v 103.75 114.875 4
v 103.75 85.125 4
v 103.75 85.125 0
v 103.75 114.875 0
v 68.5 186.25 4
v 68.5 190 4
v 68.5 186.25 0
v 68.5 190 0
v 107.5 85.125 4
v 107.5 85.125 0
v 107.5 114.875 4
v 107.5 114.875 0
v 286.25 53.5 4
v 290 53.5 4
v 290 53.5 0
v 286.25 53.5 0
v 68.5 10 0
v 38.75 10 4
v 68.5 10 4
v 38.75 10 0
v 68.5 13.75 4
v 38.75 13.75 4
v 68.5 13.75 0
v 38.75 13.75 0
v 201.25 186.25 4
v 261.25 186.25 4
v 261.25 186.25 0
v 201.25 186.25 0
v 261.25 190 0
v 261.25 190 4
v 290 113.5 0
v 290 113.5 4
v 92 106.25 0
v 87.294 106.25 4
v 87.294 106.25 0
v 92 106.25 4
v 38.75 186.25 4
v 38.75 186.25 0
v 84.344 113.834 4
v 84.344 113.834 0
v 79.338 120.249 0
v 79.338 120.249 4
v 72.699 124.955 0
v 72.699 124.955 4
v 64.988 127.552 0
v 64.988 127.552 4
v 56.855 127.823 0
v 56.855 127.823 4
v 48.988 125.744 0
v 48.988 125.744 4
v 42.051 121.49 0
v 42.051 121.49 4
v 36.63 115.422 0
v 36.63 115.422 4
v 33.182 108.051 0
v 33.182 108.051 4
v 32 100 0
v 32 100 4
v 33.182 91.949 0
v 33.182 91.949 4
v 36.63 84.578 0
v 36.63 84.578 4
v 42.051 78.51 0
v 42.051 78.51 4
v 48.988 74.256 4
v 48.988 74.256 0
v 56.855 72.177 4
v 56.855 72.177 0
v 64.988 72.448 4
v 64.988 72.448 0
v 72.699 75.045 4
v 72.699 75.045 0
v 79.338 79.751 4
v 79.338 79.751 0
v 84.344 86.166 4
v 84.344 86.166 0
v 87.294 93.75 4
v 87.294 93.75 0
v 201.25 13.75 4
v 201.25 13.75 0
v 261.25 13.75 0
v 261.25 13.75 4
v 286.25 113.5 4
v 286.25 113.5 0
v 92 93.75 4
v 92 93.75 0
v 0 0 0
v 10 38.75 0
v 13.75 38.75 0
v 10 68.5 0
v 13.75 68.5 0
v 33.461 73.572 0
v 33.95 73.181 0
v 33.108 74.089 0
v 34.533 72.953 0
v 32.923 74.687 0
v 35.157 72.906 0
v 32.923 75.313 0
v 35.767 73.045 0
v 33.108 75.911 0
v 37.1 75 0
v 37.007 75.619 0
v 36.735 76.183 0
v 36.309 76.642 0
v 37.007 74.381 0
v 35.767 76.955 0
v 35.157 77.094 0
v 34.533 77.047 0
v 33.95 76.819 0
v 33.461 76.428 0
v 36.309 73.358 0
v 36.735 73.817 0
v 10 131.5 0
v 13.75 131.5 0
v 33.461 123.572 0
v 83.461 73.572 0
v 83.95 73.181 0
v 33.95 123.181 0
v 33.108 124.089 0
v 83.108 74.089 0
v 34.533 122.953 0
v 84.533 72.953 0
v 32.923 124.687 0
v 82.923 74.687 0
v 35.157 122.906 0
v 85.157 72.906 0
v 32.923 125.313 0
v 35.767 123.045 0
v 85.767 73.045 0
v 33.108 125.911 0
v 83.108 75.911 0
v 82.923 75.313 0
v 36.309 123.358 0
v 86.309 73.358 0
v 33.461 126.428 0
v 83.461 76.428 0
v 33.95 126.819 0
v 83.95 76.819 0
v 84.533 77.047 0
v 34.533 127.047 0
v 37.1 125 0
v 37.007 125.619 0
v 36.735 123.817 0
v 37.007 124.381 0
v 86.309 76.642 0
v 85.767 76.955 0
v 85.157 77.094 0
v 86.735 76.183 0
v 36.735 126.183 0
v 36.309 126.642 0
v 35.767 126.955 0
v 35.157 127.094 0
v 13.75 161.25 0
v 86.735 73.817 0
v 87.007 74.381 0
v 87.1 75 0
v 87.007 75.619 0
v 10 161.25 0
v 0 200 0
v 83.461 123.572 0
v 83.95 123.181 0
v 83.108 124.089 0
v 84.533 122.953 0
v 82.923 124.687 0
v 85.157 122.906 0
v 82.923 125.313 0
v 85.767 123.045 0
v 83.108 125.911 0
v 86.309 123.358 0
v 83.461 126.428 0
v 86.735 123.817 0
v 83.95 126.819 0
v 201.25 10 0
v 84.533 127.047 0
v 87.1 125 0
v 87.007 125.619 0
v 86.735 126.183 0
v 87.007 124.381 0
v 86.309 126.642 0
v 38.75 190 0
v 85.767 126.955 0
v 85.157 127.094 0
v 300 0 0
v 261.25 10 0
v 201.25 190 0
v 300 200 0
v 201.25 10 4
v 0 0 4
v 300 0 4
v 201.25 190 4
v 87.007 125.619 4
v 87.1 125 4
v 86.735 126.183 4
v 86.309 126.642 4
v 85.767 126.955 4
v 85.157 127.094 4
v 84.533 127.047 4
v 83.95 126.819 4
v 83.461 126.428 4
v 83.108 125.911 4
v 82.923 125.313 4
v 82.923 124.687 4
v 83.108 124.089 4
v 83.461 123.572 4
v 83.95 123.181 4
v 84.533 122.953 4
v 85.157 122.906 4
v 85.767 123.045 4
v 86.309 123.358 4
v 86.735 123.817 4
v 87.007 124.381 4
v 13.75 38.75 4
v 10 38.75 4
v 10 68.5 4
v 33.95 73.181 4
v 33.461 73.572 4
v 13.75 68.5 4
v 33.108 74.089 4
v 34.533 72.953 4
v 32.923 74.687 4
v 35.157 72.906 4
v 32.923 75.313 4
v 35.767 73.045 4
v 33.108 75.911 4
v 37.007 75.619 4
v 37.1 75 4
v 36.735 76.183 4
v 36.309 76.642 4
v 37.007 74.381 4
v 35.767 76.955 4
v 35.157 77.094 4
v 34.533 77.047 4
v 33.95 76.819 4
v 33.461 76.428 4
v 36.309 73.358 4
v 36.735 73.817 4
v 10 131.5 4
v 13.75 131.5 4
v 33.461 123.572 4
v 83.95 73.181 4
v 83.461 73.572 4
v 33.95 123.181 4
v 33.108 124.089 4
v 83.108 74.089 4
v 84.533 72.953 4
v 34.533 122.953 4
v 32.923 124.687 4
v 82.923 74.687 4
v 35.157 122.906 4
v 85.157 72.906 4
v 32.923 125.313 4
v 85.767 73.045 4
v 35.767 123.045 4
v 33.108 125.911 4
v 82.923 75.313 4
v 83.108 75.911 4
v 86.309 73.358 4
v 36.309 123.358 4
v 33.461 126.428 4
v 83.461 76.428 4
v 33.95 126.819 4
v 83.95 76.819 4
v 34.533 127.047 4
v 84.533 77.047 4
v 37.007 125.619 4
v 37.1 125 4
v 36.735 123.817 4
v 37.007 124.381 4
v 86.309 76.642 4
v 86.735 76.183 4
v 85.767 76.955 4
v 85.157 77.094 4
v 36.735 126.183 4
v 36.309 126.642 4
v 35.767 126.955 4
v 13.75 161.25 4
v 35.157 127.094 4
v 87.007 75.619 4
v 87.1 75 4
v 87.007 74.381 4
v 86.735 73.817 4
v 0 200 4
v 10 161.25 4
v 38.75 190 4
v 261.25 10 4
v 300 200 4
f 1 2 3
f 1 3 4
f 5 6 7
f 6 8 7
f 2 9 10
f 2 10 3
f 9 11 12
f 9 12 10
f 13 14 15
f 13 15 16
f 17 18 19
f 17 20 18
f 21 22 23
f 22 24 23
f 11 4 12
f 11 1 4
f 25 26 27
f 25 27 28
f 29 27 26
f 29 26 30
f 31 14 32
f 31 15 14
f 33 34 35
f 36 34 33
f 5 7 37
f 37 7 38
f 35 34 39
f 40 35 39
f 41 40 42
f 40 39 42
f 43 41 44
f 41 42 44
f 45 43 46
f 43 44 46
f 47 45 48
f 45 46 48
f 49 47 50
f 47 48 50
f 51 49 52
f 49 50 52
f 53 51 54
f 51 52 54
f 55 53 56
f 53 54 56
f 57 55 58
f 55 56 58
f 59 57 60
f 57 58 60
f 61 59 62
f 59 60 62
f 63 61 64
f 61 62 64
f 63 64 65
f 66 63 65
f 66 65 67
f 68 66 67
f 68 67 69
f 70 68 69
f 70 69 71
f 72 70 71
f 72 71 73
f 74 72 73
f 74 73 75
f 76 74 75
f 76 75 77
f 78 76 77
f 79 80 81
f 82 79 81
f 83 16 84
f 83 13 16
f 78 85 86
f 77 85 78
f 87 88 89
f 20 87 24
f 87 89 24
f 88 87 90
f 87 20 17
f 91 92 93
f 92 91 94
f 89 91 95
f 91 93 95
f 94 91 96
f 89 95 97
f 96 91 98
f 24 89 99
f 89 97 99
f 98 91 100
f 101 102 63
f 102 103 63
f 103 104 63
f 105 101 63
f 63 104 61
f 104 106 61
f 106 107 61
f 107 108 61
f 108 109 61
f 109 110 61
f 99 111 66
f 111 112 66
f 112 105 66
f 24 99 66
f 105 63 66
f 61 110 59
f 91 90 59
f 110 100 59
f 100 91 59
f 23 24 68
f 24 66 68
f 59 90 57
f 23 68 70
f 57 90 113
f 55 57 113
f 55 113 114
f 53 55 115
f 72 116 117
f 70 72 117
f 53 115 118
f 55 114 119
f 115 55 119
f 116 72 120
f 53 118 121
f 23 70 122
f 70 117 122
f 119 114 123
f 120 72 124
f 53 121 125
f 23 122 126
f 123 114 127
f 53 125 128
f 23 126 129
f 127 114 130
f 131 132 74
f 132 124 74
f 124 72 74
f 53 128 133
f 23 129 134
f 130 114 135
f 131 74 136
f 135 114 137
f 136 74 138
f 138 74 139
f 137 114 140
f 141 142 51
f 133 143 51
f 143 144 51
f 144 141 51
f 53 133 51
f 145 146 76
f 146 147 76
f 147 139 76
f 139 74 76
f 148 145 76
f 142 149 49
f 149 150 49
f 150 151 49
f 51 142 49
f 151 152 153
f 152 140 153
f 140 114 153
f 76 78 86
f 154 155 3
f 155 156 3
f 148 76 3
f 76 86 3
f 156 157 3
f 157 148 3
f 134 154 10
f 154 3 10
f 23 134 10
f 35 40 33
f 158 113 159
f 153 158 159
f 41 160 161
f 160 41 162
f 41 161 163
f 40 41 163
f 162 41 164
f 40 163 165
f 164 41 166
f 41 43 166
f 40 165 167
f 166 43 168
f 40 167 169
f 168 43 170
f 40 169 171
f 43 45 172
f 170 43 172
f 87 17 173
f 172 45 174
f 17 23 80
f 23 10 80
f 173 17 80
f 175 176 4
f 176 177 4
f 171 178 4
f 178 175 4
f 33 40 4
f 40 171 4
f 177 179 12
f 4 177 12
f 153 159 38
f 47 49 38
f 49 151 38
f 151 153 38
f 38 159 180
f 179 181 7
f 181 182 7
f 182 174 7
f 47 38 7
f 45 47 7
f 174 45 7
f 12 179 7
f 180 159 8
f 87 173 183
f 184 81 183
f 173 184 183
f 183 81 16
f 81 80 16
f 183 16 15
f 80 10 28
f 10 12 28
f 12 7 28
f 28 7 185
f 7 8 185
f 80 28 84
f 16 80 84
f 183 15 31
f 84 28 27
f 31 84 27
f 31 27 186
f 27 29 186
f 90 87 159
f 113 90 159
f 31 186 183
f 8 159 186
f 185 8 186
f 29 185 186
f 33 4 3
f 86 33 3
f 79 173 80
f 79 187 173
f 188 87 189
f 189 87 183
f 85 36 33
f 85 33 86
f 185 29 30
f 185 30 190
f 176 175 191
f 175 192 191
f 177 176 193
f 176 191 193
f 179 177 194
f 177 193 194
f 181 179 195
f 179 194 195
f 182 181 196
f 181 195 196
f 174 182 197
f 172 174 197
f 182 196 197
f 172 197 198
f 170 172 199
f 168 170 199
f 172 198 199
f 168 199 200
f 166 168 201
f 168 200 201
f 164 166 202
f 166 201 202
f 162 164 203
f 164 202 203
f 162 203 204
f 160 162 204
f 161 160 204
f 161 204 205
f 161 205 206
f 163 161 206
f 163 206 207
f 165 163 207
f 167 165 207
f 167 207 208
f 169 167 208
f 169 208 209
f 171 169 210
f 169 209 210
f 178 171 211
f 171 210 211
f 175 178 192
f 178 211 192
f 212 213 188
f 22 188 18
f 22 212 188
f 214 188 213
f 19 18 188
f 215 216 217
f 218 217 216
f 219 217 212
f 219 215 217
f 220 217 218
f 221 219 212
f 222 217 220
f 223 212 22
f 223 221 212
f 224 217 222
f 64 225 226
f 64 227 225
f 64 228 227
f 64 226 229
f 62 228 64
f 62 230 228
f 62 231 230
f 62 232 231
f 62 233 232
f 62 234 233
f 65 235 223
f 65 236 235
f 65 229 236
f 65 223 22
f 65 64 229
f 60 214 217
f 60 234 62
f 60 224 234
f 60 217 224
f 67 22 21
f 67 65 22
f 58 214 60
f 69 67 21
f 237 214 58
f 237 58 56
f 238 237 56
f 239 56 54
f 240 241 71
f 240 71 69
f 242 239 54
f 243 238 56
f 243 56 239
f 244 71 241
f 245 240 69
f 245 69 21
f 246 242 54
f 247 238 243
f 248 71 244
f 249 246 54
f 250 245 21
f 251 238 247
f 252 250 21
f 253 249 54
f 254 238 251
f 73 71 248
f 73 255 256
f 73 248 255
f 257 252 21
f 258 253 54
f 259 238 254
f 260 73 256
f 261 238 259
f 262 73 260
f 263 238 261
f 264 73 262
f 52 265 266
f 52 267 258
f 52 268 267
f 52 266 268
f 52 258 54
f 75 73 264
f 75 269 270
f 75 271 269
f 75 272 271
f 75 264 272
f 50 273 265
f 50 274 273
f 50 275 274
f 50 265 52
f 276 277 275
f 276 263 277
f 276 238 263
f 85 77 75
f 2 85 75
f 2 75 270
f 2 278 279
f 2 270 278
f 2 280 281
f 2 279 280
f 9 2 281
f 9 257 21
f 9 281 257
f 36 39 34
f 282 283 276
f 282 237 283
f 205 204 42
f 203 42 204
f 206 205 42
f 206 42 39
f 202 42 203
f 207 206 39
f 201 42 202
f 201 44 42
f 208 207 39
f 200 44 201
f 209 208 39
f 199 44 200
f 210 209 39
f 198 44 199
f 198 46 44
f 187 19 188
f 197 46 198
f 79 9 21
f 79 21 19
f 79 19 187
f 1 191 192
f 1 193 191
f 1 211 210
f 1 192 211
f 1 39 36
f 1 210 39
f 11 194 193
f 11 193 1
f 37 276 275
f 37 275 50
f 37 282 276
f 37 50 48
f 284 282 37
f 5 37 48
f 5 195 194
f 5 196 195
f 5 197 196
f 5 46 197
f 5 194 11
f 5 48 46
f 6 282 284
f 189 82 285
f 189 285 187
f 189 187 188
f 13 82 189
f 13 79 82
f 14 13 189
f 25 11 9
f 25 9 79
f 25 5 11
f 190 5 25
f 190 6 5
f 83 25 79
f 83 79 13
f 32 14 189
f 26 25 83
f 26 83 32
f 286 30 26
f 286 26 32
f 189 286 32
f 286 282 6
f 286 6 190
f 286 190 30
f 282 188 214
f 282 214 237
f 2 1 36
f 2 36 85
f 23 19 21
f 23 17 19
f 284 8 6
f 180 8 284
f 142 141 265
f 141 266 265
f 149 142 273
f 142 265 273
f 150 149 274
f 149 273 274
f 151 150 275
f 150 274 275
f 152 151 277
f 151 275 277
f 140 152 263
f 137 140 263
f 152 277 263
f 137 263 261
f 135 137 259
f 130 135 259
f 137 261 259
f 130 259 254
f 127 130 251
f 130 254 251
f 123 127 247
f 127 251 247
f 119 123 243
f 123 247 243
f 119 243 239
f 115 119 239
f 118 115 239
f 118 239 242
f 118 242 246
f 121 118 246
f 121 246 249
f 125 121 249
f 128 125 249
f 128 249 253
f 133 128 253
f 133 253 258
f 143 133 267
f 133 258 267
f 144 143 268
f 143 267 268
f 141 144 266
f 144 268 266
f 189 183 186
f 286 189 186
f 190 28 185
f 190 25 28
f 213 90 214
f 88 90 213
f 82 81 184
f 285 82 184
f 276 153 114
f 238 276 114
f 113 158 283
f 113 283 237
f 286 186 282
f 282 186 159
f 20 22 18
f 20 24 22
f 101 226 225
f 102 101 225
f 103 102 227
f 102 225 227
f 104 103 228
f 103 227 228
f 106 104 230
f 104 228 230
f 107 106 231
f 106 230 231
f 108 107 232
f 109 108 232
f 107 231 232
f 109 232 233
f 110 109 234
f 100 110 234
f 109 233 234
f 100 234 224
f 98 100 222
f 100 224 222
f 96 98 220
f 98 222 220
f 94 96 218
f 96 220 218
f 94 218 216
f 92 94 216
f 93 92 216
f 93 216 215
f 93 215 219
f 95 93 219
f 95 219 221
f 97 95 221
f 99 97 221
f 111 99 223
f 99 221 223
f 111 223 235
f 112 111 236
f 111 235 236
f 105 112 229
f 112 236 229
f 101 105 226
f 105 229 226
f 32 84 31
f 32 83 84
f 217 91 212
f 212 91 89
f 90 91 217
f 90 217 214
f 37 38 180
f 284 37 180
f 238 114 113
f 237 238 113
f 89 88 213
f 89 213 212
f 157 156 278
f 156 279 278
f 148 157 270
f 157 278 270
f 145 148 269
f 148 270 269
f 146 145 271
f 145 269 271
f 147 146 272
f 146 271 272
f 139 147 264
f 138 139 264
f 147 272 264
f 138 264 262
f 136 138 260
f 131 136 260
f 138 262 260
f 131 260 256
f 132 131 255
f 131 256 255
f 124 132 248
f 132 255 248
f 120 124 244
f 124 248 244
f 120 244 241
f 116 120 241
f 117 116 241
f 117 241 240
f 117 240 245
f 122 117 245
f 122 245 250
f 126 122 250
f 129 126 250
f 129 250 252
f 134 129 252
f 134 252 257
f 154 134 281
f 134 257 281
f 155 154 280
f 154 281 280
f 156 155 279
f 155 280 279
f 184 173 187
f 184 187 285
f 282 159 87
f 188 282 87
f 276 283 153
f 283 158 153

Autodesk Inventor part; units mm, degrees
ref_plane "YZ Plane" through (0, 0, 0) normal (1, 0, 0) x (0, 1, 0)
ref_plane "XZ Plane" through (0, 0, 0) normal (0, 1, 0) x (-1, 0, 0)
ref_plane "XY Plane" through (0, 0, 0) normal (0, 0, 1) x (1, 0, 0)
sketch "Sketch1" plane through (0, 0, 0) normal (0, 0, 1) x (1, 0, 0)
  line L0 (0, 0) -> (300, 0)
  line L1 (300, 0) -> (300, 200)
  line L2 (300, 200) -> (0, 200)
  line L3 (0, 200) -> (0, 0)
  line L4 (10, 10) -> (290, 10)
  line L5 (290, 10) -> (290, 190)
  line L6 (290, 190) -> (10, 190)
  line L7 (10, 190) -> (10, 10)
  line L8 (13.75, 13.75) -> (286.25, 13.75)
  line L9 (286.25, 13.75) -> (286.25, 186.25)
  line L10 (286.25, 186.25) -> (13.75, 186.25)
  line L11 (13.75, 186.25) -> (13.75, 13.75)
  line L12 (38.75, 190) -> (68.5, 190)
  line L13 (68.5, 190) -> (68.5, 186.25)
  line L14 (68.5, 186.25) -> (38.75, 186.25)
  line L15 (38.75, 186.25) -> (38.75, 190)
  line L16 (10, 161.25) -> (13.75, 161.25)
  line L17 (13.75, 161.25) -> (13.75, 131.5)
  line L18 (13.75, 131.5) -> (10, 131.5)
  line L19 (10, 131.5) -> (10, 161.25)
  line L20 (0, 0) -> (150, 0)
  line L21 (150, 0) -> (150, 100)
  line L22 (150, 100) -> (0, 100)
  line L23 (0, 100) -> (0, 0)
  line L24 (38.75, 10) -> (68.5, 10)
  line L25 (68.5, 10) -> (68.5, 13.75)
  line L26 (68.5, 13.75) -> (38.75, 13.75)
  line L27 (38.75, 13.75) -> (38.75, 10)
  line L28 (10, 38.75) -> (13.75, 38.75)
  line L29 (13.75, 38.75) -> (13.75, 68.5)
  line L30 (13.75, 68.5) -> (10, 68.5)
  line L31 (10, 68.5) -> (10, 38.75)
  line L32 (150, 200) -> (150, 100)
  line L33 (300, 200) -> (300, 0)
  line L34 (261.25, 190) -> (231.5, 190)
  line L35 (231.5, 190) -> (231.5, 186.25)
  line L36 (231.5, 186.25) -> (261.25, 186.25)
  line L37 (261.25, 186.25) -> (261.25, 190)
  line L38 (290, 161.25) -> (286.25, 161.25)
  line L39 (286.25, 161.25) -> (286.25, 131.5)
  line L40 (286.25, 131.5) -> (290, 131.5)
  line L41 (290, 131.5) -> (290, 161.25)
  line L42 (300, 100) -> (300, 0)
  line L43 (261.25, 13.75) -> (261.25, 10)
  line L44 (231.5, 10) -> (231.5, 13.75)
  line L45 (231.5, 13.75) -> (261.25, 13.75)
  line L46 (261.25, 10) -> (231.5, 10)
  line L47 (286.25, 68.5) -> (290, 68.5)
  line L48 (290, 38.75) -> (286.25, 38.75)
  line L49 (290, 68.5) -> (290, 38.75)
  line L50 (286.25, 38.75) -> (286.25, 68.5)
  point P0 (13.75, 161.25)
  point P1 (10, 131.5)
  point P2 (10, 68.5)
  point P3 (13.75, 68.5)
  point P4 (13.75, 38.75)
  point P5 (10, 38.75)
  point P6 (68.5, 13.75)
  point P7 (68.5, 10)
  point P8 (38.75, 10)
  point P9 (38.75, 13.75)
  point P10 (231.5, 186.25)
  point P11 (231.5, 190)
  point P12 (261.25, 190)
  point P13 (261.25, 186.25)
  point P14 (286.25, 131.5)
  point P15 (286.25, 161.25)
  point P16 (290, 161.25)
  point P17 (261.25, 13.75)
  point P18 (261.25, 10)
  point P19 (231.5, 10)
  point P20 (231.5, 13.75)
  point P21 (286.25, 68.5)
  point P22 (286.25, 38.75)
  point P23 (68.5, 190)
  dimension "d0" = 300
  dimension "d1" = 200
  dimension "d2" = 280
  dimension "d3" = 180
  dimension "d4" = 10
  dimension "d5" = 10
  dimension "d6" = 3.75
  dimension "d7" = 3.75
  dimension "d8" = 3.75
  dimension "d9" = 3.75
  dimension "d10" = 25
  dimension "d11" = 29.75
  dimension "d12" = 29.75
  dimension "d13" = 25
  dimension "d14" = 100
  dimension "d15" = 150
extrude "Extrusion1" add sketch "Sketch1" along normal blind 4 contours L3 L22 L7 L4 L21 L0 | L21 L4 L5 L6 L32 L2 L1 L0 | L3 L2 L32 L6 L7 L22 | L21 L8 L44 L4 | L4 L25 L8 L21 | L22 L11 L30 L7 | L7 L18 L11 L22 | L21 L32 L10 L9 L8 | L8 L11 L22 L21 | L11 L10 L32 L22 | L4 L7 L28 L11 L8 L27 | L43 L8 L9 L48 L5 L4 | L32 L10 L13 L6 | L6 L35 L10 L32 | L7 L6 L15 L10 L11 L16 | L6 L5 L38 L9 L10 L37 | L47 L9 L40 L5
sketch "Sketch2" plane through (0, 0, 4) normal (0, 0, 1) x (1, 0, 0)
  line L0 (0, 0) -> (60, 0)
  line L1 (60, 0) -> (60, 100)
  line L2 (60, 100) -> (0, 100)
  line L3 (0, 100) -> (0, 0)
  circle A0 centre (60, 100) radius 28
  circle A1 centre (85, 125) radius 2.1
  circle A2 centre (35, 125) radius 2.1
  circle A3 centre (35, 75) radius 2.1
  circle A4 centre (85, 75) radius 2.1
  dimension "d16" = 4
  dimension "d18" = 100
  dimension "d19" = 60
  dimension "d20" = 56
  dimension "d21" = 4.2
  dimension "d22" = 4.2
  dimension "d23" = 4.2
  dimension "d24" = 4.2
  dimension "d25" = 50
  dimension "d26" = 50
  dimension "d27" = 50
  dimension "d28" = 50
  dimension "d29" = 25
  dimension "d30" = 25
  dimension "d31" = 25
  dimension "d32" = 25
extrude "Extrusion2" cut sketch "Sketch2" against normal blind 10 contours A0 L2 L1 | L1 L2 A0 | A1 | A2 | A3 | A4
sketch "Sketch5" plane through (0, 0, 4) normal (0, 0, 1) x (1, 0, 0)
  line L0 (103.75, 114.875) -> (107.5, 114.875)
  line L1 (107.5, 114.875) -> (107.5, 85.125)
  line L2 (107.5, 85.125) -> (103.75, 85.125)
  line L3 (103.75, 85.125) -> (103.75, 114.875)
  line L4 (13.75, 68.5) -> (13.75, 38.75) projected
  line L5 (0, 0) -> (300, 0) projected
  point P0 (107.5, 100)
  dimension "d53" = 3.75
  dimension "d54" = 29.75
  dimension "d55" = 90
  dimension "d56" = 100
extrude "Extrusion5" cut sketch "Sketch5" against normal through all
sketch "Sketch6" plane through (0, 0, 4) normal (0, 0, 1) x (1, 0, 0)
  line L0 (286.25, 38.75) -> (286.25, 68.5) projected
  line L1 (290, 38.75) -> (286.25, 38.75)
  line L2 (286.25, 38.75) -> (286.25, 68.5)
  line L3 (286.25, 68.5) -> (290, 68.5)
  line L4 (290, 68.5) -> (290, 38.75)
  line L5 (286.25, 131.5) -> (286.25, 161.25) projected
  line L6 (290, 131.5) -> (286.25, 131.5)
  line L7 (286.25, 131.5) -> (286.25, 161.25)
  line L8 (286.25, 161.25) -> (290, 161.25)
  line L9 (290, 161.25) -> (290, 131.5)
  line L10 (290, 68.5) -> (290, 38.75) projected
  line L11 (290, 53.5) -> (286.25, 53.5)
  line L12 (286.25, 53.5) -> (286.25, 113.5)
  line L13 (286.25, 113.5) -> (290, 113.5)
  line L14 (290, 113.5) -> (290, 53.5)
  point P0 (0, 0)
  dimension "d59" = 60
  dimension "d60" = 15
extrude "Extrusion6" add sketch "Sketch6" against normal blind 4 contours L0 L11 L4 L1 | L5 L8 L9 L6
extrude "Extrusion7" cut sketch "Sketch6" against normal blind 4 contours L0 L3 L4 L11 | L12 L13 L14 L3
sketch "Sketch7" plane through (0, 0, 4) normal (0, 0, 1) x (1, 0, 0)
  line L0 (261.25, 186.25) -> (231.5, 186.25) projected
  line L1 (261.25, 186.25) -> (201.25, 186.25)
  line L2 (201.25, 186.25) -> (201.25, 190)
  line L3 (201.25, 190) -> (261.25, 190)
  line L4 (261.25, 190) -> (261.25, 186.25)
  line L5 (231.5, 190) -> (261.25, 190) projected
  line L6 (261.25, 13.75) -> (261.25, 10) projected
  line L7 (261.25, 10) -> (201.25, 10)
  line L8 (201.25, 10) -> (201.25, 13.75)
  line L9 (201.25, 13.75) -> (261.25, 13.75)
  line L10 (261.25, 13.75) -> (261.25, 10)
  point P0 (0, 0)
  dimension "d65" = 0
  dimension "d66" = 60
  dimension "d67" = 3.75
  dimension "d68" = 60
extrude "Extrusion8" cut sketch "Sketch7" against normal through all
sketch "Sketch8" plane through (0, 0, 4) normal (0, 0, 1) x (1, 0, 0)
  line L0 (86, 106.25) -> (92, 106.25)
  line L1 (92, 106.25) -> (92, 93.75)
  line L2 (92, 93.75) -> (86, 93.75)
  line L3 (86, 93.75) -> (86, 106.25)
  line L4 (0, 200) -> (0, 0) projected
  line L5 (0, 0) -> (300, 0) projected
  dimension "d73" = 6
  dimension "d74" = 12.5
  dimension "d75" = 92
  dimension "d76" = 93.75
extrude "Extrusion9" cut sketch "Sketch8" against normal through all
properties part number "bovenstuk_8AUG"
